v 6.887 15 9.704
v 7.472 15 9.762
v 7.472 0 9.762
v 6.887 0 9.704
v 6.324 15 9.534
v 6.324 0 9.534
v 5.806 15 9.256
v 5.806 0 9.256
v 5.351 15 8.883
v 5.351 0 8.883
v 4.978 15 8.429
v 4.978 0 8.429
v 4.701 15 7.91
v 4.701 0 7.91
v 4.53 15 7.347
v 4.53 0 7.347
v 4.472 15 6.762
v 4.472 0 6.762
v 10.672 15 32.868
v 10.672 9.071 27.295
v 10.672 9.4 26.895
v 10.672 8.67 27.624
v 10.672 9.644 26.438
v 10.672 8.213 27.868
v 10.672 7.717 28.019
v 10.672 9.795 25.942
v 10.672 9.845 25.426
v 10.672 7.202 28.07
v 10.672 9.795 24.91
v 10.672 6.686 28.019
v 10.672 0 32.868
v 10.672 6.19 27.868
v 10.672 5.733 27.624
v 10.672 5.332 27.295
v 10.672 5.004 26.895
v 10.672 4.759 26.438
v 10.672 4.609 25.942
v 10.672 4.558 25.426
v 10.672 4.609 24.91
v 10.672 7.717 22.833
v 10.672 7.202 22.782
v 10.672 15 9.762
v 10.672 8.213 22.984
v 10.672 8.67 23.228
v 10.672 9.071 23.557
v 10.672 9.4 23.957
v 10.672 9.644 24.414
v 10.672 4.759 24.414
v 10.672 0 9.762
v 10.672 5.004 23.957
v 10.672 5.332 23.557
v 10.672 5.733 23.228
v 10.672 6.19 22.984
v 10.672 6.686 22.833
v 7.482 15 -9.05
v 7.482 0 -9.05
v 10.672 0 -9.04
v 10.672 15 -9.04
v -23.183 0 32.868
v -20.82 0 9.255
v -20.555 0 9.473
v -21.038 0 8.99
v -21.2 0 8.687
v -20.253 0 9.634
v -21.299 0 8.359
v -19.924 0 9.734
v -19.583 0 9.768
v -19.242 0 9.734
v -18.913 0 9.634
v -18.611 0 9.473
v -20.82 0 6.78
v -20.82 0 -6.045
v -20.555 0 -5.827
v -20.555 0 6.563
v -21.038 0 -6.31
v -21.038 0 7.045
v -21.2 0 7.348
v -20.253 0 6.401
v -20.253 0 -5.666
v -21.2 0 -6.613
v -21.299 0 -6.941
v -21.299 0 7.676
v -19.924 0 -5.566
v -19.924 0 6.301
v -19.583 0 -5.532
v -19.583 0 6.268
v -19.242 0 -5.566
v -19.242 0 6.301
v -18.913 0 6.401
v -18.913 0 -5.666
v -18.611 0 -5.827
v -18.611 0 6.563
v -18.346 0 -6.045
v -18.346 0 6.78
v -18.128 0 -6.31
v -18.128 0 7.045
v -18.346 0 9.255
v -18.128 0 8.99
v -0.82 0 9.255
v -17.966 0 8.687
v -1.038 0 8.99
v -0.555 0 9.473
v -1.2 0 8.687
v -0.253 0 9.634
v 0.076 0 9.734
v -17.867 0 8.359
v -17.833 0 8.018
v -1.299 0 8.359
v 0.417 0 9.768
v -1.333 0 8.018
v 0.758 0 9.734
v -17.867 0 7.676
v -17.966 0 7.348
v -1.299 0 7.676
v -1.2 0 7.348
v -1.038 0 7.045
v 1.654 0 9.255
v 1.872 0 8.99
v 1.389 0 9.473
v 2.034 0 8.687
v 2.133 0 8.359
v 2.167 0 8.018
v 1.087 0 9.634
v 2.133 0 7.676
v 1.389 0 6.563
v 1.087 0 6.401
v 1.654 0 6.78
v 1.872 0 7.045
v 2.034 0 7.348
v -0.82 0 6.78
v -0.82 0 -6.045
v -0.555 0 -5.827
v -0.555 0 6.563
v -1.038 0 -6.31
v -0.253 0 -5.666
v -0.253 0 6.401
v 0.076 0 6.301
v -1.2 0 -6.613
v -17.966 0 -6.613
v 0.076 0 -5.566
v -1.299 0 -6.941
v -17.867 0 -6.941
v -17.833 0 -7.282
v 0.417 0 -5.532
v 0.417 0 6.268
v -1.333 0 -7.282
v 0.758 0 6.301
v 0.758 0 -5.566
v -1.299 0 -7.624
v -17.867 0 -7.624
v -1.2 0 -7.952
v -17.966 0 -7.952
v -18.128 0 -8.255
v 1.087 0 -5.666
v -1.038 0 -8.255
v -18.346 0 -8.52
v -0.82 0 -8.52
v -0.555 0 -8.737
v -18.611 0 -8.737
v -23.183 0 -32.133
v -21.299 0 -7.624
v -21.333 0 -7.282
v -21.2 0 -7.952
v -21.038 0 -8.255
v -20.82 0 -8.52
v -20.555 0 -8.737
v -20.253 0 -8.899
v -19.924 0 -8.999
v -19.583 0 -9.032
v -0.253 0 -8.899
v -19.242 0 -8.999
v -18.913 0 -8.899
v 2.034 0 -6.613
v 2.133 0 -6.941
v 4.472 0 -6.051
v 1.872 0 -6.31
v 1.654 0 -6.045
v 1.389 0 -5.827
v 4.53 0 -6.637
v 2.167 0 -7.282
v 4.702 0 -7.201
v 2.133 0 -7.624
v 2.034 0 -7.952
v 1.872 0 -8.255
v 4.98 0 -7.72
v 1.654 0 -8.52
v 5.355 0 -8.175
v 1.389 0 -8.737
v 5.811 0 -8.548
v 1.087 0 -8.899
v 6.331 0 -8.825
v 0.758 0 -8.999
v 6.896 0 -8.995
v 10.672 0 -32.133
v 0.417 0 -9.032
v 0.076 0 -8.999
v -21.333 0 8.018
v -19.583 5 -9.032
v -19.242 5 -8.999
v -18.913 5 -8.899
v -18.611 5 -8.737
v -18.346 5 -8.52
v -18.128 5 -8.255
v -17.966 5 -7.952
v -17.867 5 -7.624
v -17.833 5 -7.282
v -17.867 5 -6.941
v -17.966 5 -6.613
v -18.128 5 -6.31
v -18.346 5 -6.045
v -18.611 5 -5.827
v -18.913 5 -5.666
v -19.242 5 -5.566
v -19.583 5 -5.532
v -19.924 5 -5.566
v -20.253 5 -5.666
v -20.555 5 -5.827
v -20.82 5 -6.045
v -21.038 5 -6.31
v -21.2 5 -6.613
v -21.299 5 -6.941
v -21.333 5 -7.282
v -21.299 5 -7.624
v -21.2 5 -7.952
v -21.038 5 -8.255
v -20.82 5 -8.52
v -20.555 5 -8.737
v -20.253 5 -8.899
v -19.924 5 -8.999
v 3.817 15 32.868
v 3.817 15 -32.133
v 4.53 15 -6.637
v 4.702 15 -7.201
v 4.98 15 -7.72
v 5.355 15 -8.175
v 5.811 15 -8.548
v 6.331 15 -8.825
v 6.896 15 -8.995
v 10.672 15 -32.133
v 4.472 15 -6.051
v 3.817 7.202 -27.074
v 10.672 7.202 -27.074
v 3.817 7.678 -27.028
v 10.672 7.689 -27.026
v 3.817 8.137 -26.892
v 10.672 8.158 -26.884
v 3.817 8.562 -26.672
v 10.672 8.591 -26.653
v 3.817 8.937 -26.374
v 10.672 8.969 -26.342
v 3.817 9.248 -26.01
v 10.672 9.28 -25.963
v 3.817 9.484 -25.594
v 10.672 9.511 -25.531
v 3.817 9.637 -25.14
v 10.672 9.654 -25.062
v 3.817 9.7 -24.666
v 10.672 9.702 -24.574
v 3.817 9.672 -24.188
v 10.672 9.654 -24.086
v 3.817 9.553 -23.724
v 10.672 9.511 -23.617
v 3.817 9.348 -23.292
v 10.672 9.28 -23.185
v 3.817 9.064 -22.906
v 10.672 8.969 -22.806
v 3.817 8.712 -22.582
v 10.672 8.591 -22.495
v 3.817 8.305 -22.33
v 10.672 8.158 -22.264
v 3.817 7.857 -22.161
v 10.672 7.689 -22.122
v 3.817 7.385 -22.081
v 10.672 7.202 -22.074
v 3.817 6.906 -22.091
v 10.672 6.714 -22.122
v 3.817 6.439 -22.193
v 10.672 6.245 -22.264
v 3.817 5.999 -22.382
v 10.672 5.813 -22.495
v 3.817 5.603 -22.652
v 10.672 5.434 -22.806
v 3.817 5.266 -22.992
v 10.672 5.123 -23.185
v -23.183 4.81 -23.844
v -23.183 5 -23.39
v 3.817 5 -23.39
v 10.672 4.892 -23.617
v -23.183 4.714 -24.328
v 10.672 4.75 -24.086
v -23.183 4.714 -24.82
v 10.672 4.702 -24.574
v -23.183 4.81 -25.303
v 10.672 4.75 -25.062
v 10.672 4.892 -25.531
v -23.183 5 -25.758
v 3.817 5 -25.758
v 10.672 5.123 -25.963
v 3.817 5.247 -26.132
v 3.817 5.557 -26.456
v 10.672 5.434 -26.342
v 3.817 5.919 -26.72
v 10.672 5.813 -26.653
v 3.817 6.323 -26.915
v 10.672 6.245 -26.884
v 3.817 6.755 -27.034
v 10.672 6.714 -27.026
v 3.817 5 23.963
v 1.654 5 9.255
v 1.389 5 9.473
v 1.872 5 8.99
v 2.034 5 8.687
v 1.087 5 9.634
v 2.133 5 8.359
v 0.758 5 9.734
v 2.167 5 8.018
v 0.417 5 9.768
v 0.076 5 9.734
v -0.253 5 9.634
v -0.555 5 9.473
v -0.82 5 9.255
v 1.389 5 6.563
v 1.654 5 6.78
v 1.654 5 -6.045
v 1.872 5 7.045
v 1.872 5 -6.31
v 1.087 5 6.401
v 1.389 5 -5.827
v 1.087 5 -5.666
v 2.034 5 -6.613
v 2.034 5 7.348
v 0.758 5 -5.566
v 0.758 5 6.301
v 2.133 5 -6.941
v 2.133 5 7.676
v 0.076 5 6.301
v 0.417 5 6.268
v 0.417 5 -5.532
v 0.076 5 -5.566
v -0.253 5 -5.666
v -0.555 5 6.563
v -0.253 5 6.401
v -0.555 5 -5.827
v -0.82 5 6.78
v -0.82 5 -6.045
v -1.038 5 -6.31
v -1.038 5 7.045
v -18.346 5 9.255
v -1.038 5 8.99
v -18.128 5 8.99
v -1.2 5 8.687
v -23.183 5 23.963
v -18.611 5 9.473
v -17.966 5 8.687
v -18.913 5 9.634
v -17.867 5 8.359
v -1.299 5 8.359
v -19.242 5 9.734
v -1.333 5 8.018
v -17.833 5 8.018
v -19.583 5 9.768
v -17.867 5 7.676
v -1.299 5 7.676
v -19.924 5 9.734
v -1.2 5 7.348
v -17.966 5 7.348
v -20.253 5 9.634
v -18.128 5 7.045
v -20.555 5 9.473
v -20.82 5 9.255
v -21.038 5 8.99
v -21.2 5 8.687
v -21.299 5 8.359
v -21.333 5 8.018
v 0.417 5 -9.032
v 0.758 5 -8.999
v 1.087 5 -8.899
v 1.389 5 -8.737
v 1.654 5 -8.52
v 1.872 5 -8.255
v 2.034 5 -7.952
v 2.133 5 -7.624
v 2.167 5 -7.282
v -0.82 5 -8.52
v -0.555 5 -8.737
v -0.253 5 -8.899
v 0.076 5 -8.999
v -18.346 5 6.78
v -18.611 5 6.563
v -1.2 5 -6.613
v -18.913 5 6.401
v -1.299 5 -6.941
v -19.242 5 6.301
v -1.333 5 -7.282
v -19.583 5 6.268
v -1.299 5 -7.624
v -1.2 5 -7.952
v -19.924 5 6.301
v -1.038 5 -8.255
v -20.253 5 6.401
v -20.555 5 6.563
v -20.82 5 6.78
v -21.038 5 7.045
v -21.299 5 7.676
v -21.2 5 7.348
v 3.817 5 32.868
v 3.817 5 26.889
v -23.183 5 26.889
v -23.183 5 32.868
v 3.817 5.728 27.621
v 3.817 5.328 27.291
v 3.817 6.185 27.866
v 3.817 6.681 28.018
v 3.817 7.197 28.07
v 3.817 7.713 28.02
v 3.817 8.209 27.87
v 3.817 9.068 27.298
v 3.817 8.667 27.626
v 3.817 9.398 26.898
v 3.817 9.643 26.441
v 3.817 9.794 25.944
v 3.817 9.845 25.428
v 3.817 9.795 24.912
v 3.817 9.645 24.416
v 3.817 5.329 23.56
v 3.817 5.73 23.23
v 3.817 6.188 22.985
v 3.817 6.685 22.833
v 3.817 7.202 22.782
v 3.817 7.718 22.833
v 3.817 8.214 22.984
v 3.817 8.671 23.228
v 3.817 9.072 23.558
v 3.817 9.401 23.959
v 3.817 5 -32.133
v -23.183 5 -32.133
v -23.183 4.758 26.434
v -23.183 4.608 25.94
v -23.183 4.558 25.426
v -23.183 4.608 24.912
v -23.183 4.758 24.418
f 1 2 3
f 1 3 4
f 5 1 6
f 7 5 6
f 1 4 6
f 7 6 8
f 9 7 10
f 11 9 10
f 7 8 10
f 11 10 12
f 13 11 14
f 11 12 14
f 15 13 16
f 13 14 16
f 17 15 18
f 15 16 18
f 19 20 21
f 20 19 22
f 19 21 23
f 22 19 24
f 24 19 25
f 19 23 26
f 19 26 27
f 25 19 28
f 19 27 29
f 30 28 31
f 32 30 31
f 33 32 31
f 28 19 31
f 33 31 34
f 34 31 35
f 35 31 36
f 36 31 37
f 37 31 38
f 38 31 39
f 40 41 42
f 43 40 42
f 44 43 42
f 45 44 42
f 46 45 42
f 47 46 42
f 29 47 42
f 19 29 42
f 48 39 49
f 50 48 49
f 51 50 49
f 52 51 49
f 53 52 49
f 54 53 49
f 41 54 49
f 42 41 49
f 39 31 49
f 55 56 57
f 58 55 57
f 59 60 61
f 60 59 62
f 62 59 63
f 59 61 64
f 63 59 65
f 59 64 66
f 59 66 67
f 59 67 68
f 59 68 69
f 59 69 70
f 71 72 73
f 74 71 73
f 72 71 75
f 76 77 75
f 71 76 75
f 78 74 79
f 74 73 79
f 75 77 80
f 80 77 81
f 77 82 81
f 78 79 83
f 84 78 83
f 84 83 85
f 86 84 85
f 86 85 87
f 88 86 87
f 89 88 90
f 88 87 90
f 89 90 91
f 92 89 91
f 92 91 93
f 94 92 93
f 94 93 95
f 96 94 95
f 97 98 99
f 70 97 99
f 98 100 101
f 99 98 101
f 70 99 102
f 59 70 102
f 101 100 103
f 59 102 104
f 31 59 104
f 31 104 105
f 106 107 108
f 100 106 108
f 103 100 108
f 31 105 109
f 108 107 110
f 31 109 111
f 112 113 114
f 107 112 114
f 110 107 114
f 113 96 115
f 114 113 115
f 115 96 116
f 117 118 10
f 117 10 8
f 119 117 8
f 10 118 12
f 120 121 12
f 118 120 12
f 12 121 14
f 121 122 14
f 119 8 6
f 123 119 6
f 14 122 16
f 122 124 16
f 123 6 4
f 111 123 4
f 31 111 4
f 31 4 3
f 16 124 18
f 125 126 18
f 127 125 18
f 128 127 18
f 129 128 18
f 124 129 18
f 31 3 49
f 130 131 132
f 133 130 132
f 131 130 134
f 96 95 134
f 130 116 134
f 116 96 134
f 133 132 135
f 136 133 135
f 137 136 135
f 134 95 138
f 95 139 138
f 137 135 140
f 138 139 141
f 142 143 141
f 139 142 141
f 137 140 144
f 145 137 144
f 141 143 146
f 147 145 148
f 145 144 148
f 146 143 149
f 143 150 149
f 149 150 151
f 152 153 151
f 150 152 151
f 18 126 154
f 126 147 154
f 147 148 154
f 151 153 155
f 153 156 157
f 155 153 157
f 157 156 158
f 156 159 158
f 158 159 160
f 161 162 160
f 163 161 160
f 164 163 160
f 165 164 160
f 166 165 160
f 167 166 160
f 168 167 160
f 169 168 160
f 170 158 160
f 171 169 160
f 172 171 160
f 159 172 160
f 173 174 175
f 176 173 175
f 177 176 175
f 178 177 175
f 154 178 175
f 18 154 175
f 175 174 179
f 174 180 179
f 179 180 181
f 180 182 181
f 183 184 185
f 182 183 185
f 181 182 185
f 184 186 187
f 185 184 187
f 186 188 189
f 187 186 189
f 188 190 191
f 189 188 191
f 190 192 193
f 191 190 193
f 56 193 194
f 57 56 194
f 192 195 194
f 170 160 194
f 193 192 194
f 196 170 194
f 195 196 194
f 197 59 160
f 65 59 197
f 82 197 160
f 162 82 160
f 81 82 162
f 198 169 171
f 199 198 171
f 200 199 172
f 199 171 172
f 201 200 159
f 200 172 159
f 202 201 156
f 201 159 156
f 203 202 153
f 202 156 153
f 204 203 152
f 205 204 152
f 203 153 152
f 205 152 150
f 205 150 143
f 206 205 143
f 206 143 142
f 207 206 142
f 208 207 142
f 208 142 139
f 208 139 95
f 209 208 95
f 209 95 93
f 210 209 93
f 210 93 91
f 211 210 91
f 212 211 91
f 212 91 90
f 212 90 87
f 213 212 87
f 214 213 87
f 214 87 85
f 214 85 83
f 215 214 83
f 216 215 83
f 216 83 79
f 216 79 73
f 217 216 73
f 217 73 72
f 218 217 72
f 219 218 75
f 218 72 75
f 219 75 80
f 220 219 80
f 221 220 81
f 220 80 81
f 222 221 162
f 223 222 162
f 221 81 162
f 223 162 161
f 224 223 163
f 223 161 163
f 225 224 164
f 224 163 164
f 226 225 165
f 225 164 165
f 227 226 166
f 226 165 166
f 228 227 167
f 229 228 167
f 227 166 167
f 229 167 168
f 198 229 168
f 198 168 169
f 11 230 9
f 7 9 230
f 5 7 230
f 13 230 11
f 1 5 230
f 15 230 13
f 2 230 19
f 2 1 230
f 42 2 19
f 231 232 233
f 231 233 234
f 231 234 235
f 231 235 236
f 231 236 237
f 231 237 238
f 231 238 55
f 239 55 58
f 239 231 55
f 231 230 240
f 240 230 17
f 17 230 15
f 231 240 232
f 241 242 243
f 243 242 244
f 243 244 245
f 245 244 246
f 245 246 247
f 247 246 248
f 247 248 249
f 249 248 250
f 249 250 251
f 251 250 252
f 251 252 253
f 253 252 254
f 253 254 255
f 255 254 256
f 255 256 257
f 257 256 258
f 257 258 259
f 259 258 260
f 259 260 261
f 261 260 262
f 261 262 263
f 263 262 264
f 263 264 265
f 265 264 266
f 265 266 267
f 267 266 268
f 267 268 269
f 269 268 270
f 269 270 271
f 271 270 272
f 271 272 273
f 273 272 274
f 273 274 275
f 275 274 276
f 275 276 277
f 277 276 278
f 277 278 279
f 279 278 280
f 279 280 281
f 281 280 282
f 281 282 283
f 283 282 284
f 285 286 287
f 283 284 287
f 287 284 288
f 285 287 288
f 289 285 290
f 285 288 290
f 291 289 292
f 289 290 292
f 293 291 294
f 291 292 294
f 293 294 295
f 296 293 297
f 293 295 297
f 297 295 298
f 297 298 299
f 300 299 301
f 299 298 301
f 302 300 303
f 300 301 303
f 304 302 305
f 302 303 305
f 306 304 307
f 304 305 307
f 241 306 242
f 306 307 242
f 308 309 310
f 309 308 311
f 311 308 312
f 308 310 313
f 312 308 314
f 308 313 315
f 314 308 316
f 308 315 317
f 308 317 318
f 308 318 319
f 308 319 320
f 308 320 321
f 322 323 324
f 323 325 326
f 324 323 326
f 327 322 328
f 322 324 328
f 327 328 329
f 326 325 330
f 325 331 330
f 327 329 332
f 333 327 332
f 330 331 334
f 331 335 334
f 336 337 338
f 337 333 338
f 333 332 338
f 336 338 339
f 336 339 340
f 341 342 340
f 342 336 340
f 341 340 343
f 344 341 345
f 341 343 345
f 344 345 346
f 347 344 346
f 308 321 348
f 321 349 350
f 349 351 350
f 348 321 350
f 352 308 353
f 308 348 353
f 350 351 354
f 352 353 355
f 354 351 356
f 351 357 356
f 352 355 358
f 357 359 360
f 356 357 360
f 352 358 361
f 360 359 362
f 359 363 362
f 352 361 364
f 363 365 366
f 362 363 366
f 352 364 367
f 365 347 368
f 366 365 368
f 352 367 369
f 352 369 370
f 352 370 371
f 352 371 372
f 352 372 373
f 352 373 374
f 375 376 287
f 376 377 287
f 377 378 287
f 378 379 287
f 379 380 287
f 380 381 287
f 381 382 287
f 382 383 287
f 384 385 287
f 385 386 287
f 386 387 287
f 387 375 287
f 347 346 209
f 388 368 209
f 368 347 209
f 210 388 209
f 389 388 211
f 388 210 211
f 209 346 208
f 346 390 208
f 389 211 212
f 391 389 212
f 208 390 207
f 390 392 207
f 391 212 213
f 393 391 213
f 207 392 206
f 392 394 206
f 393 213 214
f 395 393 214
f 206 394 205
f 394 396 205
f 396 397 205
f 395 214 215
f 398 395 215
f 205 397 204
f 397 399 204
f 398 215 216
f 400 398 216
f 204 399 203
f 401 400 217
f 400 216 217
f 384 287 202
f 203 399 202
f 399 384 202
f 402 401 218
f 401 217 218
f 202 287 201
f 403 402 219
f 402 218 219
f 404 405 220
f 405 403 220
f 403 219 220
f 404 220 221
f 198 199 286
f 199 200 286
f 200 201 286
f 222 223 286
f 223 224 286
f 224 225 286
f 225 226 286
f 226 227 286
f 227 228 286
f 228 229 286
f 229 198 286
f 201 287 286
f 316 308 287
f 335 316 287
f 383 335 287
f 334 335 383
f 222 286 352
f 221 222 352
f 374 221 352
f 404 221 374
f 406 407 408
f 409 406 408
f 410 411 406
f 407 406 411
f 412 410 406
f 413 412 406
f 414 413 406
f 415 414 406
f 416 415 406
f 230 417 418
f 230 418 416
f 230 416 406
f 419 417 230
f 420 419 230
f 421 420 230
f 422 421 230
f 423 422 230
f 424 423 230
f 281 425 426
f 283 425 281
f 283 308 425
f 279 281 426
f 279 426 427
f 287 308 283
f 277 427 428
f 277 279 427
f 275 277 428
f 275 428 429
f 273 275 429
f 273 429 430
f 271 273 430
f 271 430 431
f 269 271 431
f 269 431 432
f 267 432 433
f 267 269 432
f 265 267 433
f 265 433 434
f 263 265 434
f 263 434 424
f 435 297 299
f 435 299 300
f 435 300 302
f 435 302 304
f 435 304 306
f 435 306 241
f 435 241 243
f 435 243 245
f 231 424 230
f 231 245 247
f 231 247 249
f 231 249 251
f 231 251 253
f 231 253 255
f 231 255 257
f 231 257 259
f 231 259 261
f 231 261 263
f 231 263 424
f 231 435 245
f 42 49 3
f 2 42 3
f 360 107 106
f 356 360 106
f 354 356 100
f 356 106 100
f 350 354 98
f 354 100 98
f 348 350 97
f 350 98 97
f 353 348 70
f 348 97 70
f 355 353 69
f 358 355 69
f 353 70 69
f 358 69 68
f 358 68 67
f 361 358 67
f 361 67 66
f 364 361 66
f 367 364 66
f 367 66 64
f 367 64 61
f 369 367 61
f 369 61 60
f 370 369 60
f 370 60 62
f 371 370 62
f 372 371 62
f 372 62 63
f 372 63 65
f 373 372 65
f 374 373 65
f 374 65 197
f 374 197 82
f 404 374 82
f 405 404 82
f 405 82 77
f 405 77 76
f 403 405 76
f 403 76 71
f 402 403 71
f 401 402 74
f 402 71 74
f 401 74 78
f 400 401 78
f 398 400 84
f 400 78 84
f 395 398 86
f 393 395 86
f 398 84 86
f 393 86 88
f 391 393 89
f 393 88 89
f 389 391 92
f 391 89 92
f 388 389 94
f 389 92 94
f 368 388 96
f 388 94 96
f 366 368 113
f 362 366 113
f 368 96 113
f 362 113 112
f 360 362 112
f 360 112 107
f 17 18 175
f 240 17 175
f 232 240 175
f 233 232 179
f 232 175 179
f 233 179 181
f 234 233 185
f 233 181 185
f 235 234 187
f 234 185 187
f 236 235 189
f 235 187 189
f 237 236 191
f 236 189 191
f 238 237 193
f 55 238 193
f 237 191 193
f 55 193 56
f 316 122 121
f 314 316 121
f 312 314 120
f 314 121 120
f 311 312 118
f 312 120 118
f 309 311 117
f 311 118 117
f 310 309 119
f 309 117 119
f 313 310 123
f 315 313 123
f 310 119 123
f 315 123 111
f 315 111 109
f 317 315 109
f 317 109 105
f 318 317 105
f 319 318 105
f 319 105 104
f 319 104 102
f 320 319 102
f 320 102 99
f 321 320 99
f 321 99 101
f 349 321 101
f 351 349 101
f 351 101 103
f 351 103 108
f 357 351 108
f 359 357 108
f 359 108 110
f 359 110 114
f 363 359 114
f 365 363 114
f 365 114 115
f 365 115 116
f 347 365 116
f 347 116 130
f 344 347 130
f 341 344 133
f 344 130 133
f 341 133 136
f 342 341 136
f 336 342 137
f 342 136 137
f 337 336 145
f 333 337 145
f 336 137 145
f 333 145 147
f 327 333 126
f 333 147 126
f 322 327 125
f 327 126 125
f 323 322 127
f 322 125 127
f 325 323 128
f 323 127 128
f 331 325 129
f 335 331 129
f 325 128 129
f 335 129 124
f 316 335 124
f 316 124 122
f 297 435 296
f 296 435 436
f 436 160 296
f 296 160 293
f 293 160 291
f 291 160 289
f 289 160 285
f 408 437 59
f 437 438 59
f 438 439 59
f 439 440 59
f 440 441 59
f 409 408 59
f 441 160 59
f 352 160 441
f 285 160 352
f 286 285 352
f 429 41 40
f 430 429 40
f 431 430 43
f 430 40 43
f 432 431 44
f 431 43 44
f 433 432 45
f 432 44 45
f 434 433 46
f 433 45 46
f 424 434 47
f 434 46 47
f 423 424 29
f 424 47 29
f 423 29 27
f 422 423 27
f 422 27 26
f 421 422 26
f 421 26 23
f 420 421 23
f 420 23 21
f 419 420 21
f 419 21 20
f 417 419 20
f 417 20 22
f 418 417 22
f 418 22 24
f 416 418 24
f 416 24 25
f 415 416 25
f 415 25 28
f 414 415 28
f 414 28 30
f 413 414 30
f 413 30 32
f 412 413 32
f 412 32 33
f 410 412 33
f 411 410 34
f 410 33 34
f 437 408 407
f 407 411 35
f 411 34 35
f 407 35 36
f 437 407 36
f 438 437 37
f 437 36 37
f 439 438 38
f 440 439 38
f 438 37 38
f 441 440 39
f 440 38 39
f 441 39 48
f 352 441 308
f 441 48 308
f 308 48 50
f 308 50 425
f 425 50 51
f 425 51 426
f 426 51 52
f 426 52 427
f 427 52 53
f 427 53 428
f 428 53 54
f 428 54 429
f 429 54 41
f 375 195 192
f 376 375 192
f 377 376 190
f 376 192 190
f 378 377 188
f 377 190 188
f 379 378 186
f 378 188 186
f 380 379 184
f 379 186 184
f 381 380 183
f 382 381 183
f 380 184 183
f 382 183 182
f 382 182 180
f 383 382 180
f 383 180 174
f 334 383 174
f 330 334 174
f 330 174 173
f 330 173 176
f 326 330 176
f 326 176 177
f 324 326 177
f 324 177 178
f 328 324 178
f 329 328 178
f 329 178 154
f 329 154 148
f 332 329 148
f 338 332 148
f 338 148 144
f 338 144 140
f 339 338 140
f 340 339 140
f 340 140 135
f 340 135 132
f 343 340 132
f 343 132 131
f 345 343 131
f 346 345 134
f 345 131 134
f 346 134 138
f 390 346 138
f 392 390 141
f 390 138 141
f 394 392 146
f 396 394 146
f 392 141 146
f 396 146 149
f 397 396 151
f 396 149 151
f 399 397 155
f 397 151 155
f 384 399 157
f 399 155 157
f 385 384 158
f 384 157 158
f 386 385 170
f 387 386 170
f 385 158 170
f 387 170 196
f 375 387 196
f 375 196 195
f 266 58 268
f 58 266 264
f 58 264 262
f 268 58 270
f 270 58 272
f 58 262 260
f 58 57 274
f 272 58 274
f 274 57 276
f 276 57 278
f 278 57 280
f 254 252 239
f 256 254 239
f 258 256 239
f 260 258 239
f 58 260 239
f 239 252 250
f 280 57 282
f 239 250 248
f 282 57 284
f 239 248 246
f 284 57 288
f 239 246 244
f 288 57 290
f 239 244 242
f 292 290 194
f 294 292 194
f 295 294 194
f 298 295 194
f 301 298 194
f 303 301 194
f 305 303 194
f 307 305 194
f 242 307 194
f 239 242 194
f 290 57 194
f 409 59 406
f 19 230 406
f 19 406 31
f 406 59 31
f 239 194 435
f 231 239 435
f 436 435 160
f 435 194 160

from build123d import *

# Parameters (mm, degrees)
SALIENTE_EXTRUIR1_DEPTH = 15
CROQUIS3_W              = 27
CROQUIS3_H              = 10
CORTAR_EXTRUIR1_DEPTH   = 103
CROQUIS2_R              = 1.75
CORTAR_EXTRUIR2_DEPTH   = 25.85
CROQUIS4_R              = 2.5
CROQUIS4_R_2            = 2.643656248
CORTAR_EXTRUIR3_DEPTH   = 34


with BuildPart() as part:
    # Croquis1 → Saliente-Extruir1 (new body)
    with BuildSketch(Plane(origin=(0, 0, 0), x_dir=(1, 0, 0), z_dir=(0, 1, 0))):
        with BuildLine():
            Line((10.672482707, -9.762077578), (7.472477359, -9.762077578))
            ThreePointArc((7.472477359, -9.762077578), (5.351157015, -8.883397922), (4.472477359, -6.762077578))
            Line((4.472477359, -6.762077578), (4.472477359, 6.050505251))
            ThreePointArc((4.472477359, 6.050505251), (5.354589632, 8.175252666), (7.48217841, 9.050489566))
            Line((7.48217841, 9.050489566), (10.672482707, 9.040173078))
            Line((10.672482707, 9.040173078), (10.672482707, 32.133052813))
            Line((10.672482707, 32.133052813), (-23.183050508, 32.133052813))
            Line((-23.183050508, 32.133052813), (-23.183050508, -32.8682401))
            Line((-23.183050508, -32.8682401), (10.672482707, -32.8682401))
            Line((10.672482707, -32.8682401), (10.672482707, -9.762077578))
        make_face()
    extrude(amount=SALIENTE_EXTRUIR1_DEPTH)

    # Croquis3 → Cortar-Extruir1 (cut)
    with BuildSketch(Plane(origin=(0, 0, -32.133052813), x_dir=(-1, 0, 0), z_dir=(0, 0, -1))):
        with Locations((9.683050508, 10)):
            Rectangle(CROQUIS3_W, CROQUIS3_H)
    extrude(amount=-CORTAR_EXTRUIR1_DEPTH, mode=Mode.SUBTRACT)

    # Croquis2 → Cortar-Extruir2 (cut)
    with BuildSketch(Plane.XZ):
        with Locations(Location((0.416949492, -7.282406356, 0), (0, 0, 270))):
            Circle(CROQUIS2_R)
        with Locations(Location((-19.583050508, -7.282406356, 0), (0, 0, 270))):
            Circle(CROQUIS2_R)
        with Locations((-19.583050508, 8.017593644)):
            Circle(CROQUIS2_R)
        with Locations((0.416949492, 8.017593644)):
            Circle(CROQUIS2_R)
    extrude(amount=-CORTAR_EXTRUIR2_DEPTH, mode=Mode.SUBTRACT)

    # Croquis4 → Cortar-Extruir3 (cut)
    with BuildSketch(Plane(origin=(10.672482707, 0, 0), x_dir=(0, 0, -1), z_dir=(1, 0, 0))):
        with Locations((24.573974701, 7.201679741)):
            Circle(CROQUIS4_R)
        with Locations((-25.426025299, 7.201679741)):
            Circle(CROQUIS4_R_2)
    extrude(amount=-CORTAR_EXTRUIR3_DEPTH, mode=Mode.SUBTRACT)


solid = part.part
